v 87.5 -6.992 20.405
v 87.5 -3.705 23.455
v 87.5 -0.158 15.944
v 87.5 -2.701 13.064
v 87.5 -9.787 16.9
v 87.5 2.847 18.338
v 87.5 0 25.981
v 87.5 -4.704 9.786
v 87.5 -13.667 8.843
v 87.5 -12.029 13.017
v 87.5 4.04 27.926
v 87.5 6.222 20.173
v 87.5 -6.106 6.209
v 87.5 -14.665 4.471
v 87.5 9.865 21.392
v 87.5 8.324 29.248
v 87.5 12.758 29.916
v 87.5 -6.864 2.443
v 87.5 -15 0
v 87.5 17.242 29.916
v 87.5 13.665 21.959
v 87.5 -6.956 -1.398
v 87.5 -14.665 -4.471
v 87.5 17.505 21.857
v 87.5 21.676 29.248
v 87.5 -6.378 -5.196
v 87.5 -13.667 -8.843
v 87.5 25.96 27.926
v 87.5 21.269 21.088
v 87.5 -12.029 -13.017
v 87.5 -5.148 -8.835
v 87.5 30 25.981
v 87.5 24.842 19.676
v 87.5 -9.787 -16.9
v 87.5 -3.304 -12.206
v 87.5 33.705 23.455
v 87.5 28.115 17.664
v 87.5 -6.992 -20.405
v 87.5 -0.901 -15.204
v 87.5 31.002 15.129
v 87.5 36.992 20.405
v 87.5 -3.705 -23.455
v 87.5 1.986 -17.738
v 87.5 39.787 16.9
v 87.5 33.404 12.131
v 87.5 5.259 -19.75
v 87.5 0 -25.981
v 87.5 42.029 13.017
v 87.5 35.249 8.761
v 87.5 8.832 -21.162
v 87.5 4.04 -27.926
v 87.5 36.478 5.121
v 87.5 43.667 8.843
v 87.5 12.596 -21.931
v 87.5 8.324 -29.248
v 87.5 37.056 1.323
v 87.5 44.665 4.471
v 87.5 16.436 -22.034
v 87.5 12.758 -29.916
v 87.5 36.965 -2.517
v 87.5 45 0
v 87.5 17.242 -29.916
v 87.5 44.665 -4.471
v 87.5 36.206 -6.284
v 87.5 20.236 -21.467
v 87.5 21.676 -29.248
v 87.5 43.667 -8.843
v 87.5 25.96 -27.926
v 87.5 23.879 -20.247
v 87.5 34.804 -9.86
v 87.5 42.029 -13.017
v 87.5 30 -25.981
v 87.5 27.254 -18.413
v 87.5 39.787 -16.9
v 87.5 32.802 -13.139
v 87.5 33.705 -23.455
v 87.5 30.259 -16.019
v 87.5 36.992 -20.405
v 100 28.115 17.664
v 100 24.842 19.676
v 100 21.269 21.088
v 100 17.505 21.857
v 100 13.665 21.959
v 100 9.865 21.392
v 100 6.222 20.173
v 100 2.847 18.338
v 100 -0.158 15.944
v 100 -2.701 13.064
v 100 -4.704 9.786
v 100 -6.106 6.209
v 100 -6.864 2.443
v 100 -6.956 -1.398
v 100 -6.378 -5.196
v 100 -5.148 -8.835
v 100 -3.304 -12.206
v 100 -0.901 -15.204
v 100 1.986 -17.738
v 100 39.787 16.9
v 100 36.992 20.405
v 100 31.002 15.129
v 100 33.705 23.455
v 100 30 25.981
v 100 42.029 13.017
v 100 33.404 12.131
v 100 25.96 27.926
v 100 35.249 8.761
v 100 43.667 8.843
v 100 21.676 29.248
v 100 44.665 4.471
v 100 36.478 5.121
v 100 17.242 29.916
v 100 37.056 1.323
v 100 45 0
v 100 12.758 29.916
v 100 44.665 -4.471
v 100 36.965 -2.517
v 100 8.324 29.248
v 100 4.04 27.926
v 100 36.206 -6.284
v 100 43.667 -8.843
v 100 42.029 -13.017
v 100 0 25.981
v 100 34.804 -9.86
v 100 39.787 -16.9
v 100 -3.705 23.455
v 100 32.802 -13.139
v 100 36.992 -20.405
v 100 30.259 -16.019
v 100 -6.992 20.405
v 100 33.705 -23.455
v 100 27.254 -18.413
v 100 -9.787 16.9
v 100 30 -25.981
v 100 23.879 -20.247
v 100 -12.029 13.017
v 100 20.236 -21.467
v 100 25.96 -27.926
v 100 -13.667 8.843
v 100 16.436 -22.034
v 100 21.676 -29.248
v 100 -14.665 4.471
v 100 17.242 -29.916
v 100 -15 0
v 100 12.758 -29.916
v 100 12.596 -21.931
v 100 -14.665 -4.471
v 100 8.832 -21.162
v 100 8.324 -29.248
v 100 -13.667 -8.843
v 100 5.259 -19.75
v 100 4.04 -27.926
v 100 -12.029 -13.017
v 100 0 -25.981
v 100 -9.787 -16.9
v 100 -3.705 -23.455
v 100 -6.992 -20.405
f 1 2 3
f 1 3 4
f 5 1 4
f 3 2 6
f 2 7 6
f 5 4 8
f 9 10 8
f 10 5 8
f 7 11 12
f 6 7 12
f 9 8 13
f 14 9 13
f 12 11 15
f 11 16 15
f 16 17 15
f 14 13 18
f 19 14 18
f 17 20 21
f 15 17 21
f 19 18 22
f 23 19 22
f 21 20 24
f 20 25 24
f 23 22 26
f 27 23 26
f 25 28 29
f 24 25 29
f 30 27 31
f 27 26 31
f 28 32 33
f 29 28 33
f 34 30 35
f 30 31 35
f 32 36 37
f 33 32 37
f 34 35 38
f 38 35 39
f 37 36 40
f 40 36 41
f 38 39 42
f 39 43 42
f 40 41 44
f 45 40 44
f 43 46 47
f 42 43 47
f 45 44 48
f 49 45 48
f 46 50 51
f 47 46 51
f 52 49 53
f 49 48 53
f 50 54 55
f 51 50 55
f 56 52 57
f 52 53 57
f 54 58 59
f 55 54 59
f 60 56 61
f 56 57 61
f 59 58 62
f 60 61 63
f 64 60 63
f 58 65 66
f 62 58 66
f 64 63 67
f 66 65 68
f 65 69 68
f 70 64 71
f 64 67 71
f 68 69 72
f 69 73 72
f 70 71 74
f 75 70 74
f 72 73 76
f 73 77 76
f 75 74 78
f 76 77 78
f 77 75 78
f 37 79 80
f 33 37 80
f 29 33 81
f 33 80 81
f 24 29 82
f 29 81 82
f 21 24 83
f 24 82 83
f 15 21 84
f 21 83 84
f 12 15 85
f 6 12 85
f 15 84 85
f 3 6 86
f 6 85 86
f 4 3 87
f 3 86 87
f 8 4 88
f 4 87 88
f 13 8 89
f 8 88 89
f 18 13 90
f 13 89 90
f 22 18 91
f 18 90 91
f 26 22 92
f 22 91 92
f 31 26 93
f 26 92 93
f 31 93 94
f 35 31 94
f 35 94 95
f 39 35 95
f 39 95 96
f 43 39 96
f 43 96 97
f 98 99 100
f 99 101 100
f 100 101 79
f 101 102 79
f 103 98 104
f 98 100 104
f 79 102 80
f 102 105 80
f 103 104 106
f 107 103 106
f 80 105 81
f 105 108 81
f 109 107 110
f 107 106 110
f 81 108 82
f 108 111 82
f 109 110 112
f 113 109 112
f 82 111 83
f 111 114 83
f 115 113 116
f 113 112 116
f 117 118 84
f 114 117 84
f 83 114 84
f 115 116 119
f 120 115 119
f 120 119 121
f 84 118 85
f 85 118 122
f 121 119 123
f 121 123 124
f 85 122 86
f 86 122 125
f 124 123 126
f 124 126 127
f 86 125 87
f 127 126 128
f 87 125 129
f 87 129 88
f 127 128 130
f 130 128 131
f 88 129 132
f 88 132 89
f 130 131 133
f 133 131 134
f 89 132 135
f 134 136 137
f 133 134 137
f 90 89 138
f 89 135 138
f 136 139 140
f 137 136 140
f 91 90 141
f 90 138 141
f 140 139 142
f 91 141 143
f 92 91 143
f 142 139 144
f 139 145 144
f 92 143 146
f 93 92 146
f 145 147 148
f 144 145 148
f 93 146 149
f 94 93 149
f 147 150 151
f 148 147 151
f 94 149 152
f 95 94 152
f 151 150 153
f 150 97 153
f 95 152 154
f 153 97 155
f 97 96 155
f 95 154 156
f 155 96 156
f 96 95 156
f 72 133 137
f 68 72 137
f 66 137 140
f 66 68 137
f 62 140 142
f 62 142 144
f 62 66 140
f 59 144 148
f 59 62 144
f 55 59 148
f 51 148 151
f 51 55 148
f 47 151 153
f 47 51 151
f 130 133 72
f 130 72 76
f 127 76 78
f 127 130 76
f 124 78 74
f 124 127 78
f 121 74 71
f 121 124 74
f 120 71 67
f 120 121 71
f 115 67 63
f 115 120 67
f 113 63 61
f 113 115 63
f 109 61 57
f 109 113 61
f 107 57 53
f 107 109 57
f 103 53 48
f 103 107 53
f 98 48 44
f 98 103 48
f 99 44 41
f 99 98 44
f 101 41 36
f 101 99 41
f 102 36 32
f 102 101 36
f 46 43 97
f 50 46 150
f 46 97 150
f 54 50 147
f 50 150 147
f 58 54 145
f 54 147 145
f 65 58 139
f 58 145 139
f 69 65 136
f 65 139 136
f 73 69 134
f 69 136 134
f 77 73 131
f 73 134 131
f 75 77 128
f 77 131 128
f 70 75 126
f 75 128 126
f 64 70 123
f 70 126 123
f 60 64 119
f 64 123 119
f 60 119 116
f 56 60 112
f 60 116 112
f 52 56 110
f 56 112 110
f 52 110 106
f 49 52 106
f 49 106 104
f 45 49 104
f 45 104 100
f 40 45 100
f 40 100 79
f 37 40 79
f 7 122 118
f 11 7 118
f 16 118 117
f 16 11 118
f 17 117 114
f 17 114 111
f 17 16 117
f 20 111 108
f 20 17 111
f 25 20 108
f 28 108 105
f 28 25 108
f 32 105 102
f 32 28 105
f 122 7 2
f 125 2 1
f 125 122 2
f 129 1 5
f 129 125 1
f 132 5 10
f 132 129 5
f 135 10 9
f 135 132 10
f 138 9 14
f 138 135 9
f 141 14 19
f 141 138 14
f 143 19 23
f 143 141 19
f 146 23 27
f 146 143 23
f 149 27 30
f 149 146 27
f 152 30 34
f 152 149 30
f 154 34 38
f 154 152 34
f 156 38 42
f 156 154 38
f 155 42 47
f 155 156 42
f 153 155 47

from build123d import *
from build123d.topology import SkipClean

# Parameters (mm, degrees)
SKETCH1_W           = 200
SKETCH1_H           = 200
BOSS_EXTRUDE1_DEPTH = 30
SKETCH4_W           = 175
SKETCH4_H           = 175
CUT_EXTRUDE1_DEPTH  = 30
SKETCH7_R           = 4
CUT_EXTRUDE2_DEPTH  = 210
SKETCH10_W          = 6.040230253
SKETCH10_H          = 30
BOSS_EXTRUDE2_DEPTH = 20
SKETCH11_W          = 10
SKETCH11_H          = 30
BOSS_EXTRUDE3_DEPTH = 20
CUT_EXTRUDE3_START  = -231
SKETCH12_R          = 4
CUT_EXTRUDE3_DEPTH  = 231
SKETCH13_R          = 4
CUT_EXTRUDE5_DEPTH  = 231
SKETCH14_R          = 4
CUT_EXTRUDE6_DEPTH  = 250.5
SKETCH15_R          = 30
SKETCH15_R_2        = 22
BOSS_EXTRUDE5_DEPTH = 201
SKETCH17_R          = 22
CUT_EXTRUDE7_DEPTH  = 201
SKETCH21_W          = 9.5
SKETCH21_H          = 28.855904386
BOSS_EXTRUDE6_DEPTH = 26
SKETCH22_W          = 9.5
SKETCH22_H          = 6.040230253
CUT_EXTRUDE10_DEPTH = 49
SKETCH23_W          = 10.008922512
SKETCH23_H          = 28.855904386
BOSS_EXTRUDE7_DEPTH = 21
SKETCH24_W          = 9.5
SKETCH24_H          = 1.144095614
CUT_EXTRUDE11_DEPTH = 27
SKETCH26_W          = 0.50137975
SKETCH26_H          = 20.893624798
CUT_EXTRUDE12_DEPTH = 35
SKETCH27_R          = 49.192783102
CUT_EXTRUDE13_DEPTH = 175
SKETCH28_R          = 41.209023923
CUT_EXTRUDE14_DEPTH = 175
CUT_EXTRUDE15_START = -220
CUT_EXTRUDE15_DEPTH = 220
SKETCH33_R          = 22
CUT_EXTRUDE16_DEPTH = 220
SKETCH34_W          = 15.88682826
SKETCH34_H          = 39.259510286
CUT_EXTRUDE17_DEPTH = 14
SKETCH35_R          = 61.810225576
CUT_EXTRUDE18_DEPTH = 218


# Read off the part's stored shape, not the designer's step: Cut-Extrude15
with BuildPart() as part:
    # Sketch1 → Boss-Extrude1 (new body)
    with BuildSketch(Plane(origin=(0, 0, 0), x_dir=(1, 0, 0), z_dir=(0, 1, 0))):
        Rectangle(SKETCH1_W, SKETCH1_H)
    extrude(amount=BOSS_EXTRUDE1_DEPTH)

    # Sketch4 → Cut-Extrude1 (cut)
    with BuildSketch(Plane(origin=(0, 30, 0), x_dir=(1, 0, 0), z_dir=(0, 1, 0))):
        Rectangle(SKETCH4_W, SKETCH4_H)
    extrude(amount=-CUT_EXTRUDE1_DEPTH, mode=Mode.SUBTRACT)

    # Sketch7 → Cut-Extrude2 (cut)
    with BuildSketch(Plane.ZY.offset(100)):
        with Locations((0, 15)):
            Circle(SKETCH7_R)
    extrude(amount=-CUT_EXTRUDE2_DEPTH, mode=Mode.SUBTRACT)

    # Sketch10 → Boss-Extrude2 (add)
    with BuildSketch(Plane.ZY.offset(100)):
        with Locations((-11.64671233, 15)):
            Rectangle(SKETCH10_W, SKETCH10_H)
    extrude(amount=BOSS_EXTRUDE2_DEPTH)

    # Sketch11 → Boss-Extrude3 (add)
    with BuildSketch(Plane.XY.offset(-8.626597203)):
        with Locations((-115, 15)):
            Rectangle(SKETCH11_W, SKETCH11_H)
    extrude(amount=BOSS_EXTRUDE3_DEPTH)

    # Sketch12 → Cut-Extrude3 (cut)
    with BuildSketch(Plane(origin=(100, 0, 0), x_dir=(0, 0, -1), z_dir=(1, 0, 0)).offset(CUT_EXTRUDE3_START)):
        with Locations(Location((0, 15, 0), (0, 0, 180))):
            Circle(SKETCH12_R)
    extrude(amount=CUT_EXTRUDE3_DEPTH, mode=Mode.SUBTRACT)

    # Sketch13 → Cut-Extrude5 (cut)
    with BuildSketch(Plane(origin=(0, 30, 0), x_dir=(1, 0, 0), z_dir=(0, 1, 0))):
        with Locations(Location((-93.69452155, -93.045501349, 0), (0, 0, 270))):
            Circle(SKETCH13_R)
    extrude(amount=-CUT_EXTRUDE5_DEPTH, mode=Mode.SUBTRACT)

    # Sketch14 → Cut-Extrude6 (cut)
    with BuildSketch(Plane.XY.offset(100)):
        with Locations((0, 13.614739596)):
            Circle(SKETCH14_R)
    extrude(amount=-CUT_EXTRUDE6_DEPTH, mode=Mode.SUBTRACT)

    # Sketch15 → Boss-Extrude5 (add)
    with BuildSketch(Plane(origin=(100, 0, 0), x_dir=(0, 0, -1), z_dir=(1, 0, 0))):
        with Locations((0, 15)):
            Circle(SKETCH15_R)
        with Locations((0, 15)):
            Circle(SKETCH15_R_2, mode=Mode.SUBTRACT)
    extrude(amount=-BOSS_EXTRUDE5_DEPTH)

    # Sketch17 → Cut-Extrude7 (cut)
    with BuildSketch(Plane(origin=(100, 0, 0), x_dir=(0, 0, -1), z_dir=(1, 0, 0))):
        with Locations((0.074377339, 15.100772812)):
            Circle(SKETCH17_R)
    extrude(amount=-CUT_EXTRUDE7_DEPTH, mode=Mode.SUBTRACT)


with BuildPart() as cut_extrude7_piece_1:
    # of the separate pieces the step leaves, piece 1, a body of its own (cut_extrude7_pieces)
    add(part.part.solids().sort_by_distance((-100, 0, -100))[0])



with BuildPart() as cut_extrude7_piece_2:
    # of the separate pieces the step leaves, piece 2, a body of its own (cut_extrude7_pieces)
    add(part.part.solids().sort_by_distance((-101, 0, -14.666827456))[0])

    # Sketch21 → Boss-Extrude6 (add)
    with BuildSketch(Plane(origin=(0, 0, -14.666827456), x_dir=(-1, 0, 0), z_dir=(0, 0, -1))):
        with Locations((115.25, 15.572047807)):
            Rectangle(SKETCH21_W, SKETCH21_H)
    extrude(amount=BOSS_EXTRUDE6_DEPTH)

    # Sketch22 → Cut-Extrude10 (cut)
    with BuildSketch(Plane(origin=(0, 30, 0), x_dir=(1, 0, 0), z_dir=(0, 1, 0))):
        with Locations((-105.75, 11.64671233)):
            Rectangle(SKETCH22_W, SKETCH22_H)
    extrude(amount=-CUT_EXTRUDE10_DEPTH, mode=Mode.SUBTRACT)


with BuildPart() as cut_extrude7_piece_1_1:
    add(cut_extrude7_piece_1.part)

    add(cut_extrude7_piece_2.part)  # Boss-Extrude7 merges Cut-Extrude7 piece 2
    # Sketch23 → Boss-Extrude7 (add)
    with BuildSketch(Plane(origin=(-110.5, 0, 0), x_dir=(0, 0, -1), z_dir=(1, 0, 0))):
        with Locations((35.6623662, 15.572047807)):
            Rectangle(SKETCH23_W, SKETCH23_H)
    extrude(amount=BOSS_EXTRUDE7_DEPTH)

    # Sketch24 → Cut-Extrude11 (cut)
    with BuildSketch(Plane(origin=(0, 0, -14.666827456), x_dir=(-1, 0, 0), z_dir=(0, 0, -1))):
        with Locations((115.25, 0.572047807)):
            Rectangle(SKETCH24_W, SKETCH24_H)
    extrude(amount=-CUT_EXTRUDE11_DEPTH, mode=Mode.SUBTRACT)

    # Sketch26 → Cut-Extrude12 (cut)
    with BuildSketch(Plane.XZ):
        with Locations((-110.249310125, 1.820215196)):
            Rectangle(SKETCH26_W, SKETCH26_H)
    extrude(amount=-CUT_EXTRUDE12_DEPTH, mode=Mode.SUBTRACT)

    # Sketch27 → Cut-Extrude13 (cut)
    with BuildSketch(Plane(origin=(-87.5, 0, 0), x_dir=(0, 0, -1), z_dir=(1, 0, 0))):
        with Locations((-31.916352411, 15.376133278)):
            Circle(SKETCH27_R)
    extrude(amount=CUT_EXTRUDE13_DEPTH, mode=Mode.SUBTRACT)

    # Sketch28 → Cut-Extrude14 (cut)
    with BuildSketch(Plane(origin=(-87.5, 0, 0), x_dir=(0, 0, -1), z_dir=(1, 0, 0))):
        with Locations((37.762434774, 15.494435184)):
            Circle(SKETCH28_R)
    extrude(amount=CUT_EXTRUDE14_DEPTH, mode=Mode.SUBTRACT)

    # Cut-Extrude15 outline → Cut-Extrude15 (cut)
    with SkipClean():  # the faces are left unmerged after this step: merging them gives an invalid solid
        with BuildSketch(Plane(origin=(100, 0, 0), x_dir=(0, 0, -1), z_dir=(1, 0, 0)).offset(CUT_EXTRUDE15_START)):
            with BuildLine():
                ThreePointArc((25.980762114, 30), (30, 15), (25.980762114, 0))
                Line((25.980762114, 0), (100, 0))
                Line((100, 0), (100, 30))
                Line((100, 30), (25.980762114, 30))
            make_face()
            with BuildLine():
                ThreePointArc((-25.980762114, 0), (-30, 15), (-25.980762114, 30))
                Line((-25.980762114, 30), (-100, 30))
                Line((-100, 30), (-100, 0))
                Line((-100, 0), (-25.980762114, 0))
            make_face()
        extrude(amount=CUT_EXTRUDE15_DEPTH, mode=Mode.SUBTRACT)

    # Sketch33 → Cut-Extrude16 (cut)
    with SkipClean():  # the faces are left unmerged after this step: merging them gives an invalid solid
        with BuildSketch(Plane(origin=(100, 0, 0), x_dir=(0, 0, -1), z_dir=(1, 0, 0))):
            with Locations((0, 15)):
                Circle(SKETCH33_R)
        extrude(amount=-CUT_EXTRUDE16_DEPTH, mode=Mode.SUBTRACT)

    # Sketch34 → Cut-Extrude17 (cut)
    with SkipClean():  # the faces are left unmerged after this step: merging them gives an invalid solid
        with BuildSketch(Plane.ZY.offset(120)):
            with Locations((-24.036891069, 10.370244857)):
                Rectangle(SKETCH34_W, SKETCH34_H)
        extrude(amount=-CUT_EXTRUDE17_DEPTH, mode=Mode.SUBTRACT)

    # Sketch35 → Cut-Extrude18 (cut)
    with BuildSketch(Plane.ZY.offset(-87.5)):
        with Locations((-0.860757222, 19.909168714)):
            Circle(SKETCH35_R)
    extrude(amount=CUT_EXTRUDE18_DEPTH, mode=Mode.SUBTRACT)


solid = cut_extrude7_piece_1_1.part
